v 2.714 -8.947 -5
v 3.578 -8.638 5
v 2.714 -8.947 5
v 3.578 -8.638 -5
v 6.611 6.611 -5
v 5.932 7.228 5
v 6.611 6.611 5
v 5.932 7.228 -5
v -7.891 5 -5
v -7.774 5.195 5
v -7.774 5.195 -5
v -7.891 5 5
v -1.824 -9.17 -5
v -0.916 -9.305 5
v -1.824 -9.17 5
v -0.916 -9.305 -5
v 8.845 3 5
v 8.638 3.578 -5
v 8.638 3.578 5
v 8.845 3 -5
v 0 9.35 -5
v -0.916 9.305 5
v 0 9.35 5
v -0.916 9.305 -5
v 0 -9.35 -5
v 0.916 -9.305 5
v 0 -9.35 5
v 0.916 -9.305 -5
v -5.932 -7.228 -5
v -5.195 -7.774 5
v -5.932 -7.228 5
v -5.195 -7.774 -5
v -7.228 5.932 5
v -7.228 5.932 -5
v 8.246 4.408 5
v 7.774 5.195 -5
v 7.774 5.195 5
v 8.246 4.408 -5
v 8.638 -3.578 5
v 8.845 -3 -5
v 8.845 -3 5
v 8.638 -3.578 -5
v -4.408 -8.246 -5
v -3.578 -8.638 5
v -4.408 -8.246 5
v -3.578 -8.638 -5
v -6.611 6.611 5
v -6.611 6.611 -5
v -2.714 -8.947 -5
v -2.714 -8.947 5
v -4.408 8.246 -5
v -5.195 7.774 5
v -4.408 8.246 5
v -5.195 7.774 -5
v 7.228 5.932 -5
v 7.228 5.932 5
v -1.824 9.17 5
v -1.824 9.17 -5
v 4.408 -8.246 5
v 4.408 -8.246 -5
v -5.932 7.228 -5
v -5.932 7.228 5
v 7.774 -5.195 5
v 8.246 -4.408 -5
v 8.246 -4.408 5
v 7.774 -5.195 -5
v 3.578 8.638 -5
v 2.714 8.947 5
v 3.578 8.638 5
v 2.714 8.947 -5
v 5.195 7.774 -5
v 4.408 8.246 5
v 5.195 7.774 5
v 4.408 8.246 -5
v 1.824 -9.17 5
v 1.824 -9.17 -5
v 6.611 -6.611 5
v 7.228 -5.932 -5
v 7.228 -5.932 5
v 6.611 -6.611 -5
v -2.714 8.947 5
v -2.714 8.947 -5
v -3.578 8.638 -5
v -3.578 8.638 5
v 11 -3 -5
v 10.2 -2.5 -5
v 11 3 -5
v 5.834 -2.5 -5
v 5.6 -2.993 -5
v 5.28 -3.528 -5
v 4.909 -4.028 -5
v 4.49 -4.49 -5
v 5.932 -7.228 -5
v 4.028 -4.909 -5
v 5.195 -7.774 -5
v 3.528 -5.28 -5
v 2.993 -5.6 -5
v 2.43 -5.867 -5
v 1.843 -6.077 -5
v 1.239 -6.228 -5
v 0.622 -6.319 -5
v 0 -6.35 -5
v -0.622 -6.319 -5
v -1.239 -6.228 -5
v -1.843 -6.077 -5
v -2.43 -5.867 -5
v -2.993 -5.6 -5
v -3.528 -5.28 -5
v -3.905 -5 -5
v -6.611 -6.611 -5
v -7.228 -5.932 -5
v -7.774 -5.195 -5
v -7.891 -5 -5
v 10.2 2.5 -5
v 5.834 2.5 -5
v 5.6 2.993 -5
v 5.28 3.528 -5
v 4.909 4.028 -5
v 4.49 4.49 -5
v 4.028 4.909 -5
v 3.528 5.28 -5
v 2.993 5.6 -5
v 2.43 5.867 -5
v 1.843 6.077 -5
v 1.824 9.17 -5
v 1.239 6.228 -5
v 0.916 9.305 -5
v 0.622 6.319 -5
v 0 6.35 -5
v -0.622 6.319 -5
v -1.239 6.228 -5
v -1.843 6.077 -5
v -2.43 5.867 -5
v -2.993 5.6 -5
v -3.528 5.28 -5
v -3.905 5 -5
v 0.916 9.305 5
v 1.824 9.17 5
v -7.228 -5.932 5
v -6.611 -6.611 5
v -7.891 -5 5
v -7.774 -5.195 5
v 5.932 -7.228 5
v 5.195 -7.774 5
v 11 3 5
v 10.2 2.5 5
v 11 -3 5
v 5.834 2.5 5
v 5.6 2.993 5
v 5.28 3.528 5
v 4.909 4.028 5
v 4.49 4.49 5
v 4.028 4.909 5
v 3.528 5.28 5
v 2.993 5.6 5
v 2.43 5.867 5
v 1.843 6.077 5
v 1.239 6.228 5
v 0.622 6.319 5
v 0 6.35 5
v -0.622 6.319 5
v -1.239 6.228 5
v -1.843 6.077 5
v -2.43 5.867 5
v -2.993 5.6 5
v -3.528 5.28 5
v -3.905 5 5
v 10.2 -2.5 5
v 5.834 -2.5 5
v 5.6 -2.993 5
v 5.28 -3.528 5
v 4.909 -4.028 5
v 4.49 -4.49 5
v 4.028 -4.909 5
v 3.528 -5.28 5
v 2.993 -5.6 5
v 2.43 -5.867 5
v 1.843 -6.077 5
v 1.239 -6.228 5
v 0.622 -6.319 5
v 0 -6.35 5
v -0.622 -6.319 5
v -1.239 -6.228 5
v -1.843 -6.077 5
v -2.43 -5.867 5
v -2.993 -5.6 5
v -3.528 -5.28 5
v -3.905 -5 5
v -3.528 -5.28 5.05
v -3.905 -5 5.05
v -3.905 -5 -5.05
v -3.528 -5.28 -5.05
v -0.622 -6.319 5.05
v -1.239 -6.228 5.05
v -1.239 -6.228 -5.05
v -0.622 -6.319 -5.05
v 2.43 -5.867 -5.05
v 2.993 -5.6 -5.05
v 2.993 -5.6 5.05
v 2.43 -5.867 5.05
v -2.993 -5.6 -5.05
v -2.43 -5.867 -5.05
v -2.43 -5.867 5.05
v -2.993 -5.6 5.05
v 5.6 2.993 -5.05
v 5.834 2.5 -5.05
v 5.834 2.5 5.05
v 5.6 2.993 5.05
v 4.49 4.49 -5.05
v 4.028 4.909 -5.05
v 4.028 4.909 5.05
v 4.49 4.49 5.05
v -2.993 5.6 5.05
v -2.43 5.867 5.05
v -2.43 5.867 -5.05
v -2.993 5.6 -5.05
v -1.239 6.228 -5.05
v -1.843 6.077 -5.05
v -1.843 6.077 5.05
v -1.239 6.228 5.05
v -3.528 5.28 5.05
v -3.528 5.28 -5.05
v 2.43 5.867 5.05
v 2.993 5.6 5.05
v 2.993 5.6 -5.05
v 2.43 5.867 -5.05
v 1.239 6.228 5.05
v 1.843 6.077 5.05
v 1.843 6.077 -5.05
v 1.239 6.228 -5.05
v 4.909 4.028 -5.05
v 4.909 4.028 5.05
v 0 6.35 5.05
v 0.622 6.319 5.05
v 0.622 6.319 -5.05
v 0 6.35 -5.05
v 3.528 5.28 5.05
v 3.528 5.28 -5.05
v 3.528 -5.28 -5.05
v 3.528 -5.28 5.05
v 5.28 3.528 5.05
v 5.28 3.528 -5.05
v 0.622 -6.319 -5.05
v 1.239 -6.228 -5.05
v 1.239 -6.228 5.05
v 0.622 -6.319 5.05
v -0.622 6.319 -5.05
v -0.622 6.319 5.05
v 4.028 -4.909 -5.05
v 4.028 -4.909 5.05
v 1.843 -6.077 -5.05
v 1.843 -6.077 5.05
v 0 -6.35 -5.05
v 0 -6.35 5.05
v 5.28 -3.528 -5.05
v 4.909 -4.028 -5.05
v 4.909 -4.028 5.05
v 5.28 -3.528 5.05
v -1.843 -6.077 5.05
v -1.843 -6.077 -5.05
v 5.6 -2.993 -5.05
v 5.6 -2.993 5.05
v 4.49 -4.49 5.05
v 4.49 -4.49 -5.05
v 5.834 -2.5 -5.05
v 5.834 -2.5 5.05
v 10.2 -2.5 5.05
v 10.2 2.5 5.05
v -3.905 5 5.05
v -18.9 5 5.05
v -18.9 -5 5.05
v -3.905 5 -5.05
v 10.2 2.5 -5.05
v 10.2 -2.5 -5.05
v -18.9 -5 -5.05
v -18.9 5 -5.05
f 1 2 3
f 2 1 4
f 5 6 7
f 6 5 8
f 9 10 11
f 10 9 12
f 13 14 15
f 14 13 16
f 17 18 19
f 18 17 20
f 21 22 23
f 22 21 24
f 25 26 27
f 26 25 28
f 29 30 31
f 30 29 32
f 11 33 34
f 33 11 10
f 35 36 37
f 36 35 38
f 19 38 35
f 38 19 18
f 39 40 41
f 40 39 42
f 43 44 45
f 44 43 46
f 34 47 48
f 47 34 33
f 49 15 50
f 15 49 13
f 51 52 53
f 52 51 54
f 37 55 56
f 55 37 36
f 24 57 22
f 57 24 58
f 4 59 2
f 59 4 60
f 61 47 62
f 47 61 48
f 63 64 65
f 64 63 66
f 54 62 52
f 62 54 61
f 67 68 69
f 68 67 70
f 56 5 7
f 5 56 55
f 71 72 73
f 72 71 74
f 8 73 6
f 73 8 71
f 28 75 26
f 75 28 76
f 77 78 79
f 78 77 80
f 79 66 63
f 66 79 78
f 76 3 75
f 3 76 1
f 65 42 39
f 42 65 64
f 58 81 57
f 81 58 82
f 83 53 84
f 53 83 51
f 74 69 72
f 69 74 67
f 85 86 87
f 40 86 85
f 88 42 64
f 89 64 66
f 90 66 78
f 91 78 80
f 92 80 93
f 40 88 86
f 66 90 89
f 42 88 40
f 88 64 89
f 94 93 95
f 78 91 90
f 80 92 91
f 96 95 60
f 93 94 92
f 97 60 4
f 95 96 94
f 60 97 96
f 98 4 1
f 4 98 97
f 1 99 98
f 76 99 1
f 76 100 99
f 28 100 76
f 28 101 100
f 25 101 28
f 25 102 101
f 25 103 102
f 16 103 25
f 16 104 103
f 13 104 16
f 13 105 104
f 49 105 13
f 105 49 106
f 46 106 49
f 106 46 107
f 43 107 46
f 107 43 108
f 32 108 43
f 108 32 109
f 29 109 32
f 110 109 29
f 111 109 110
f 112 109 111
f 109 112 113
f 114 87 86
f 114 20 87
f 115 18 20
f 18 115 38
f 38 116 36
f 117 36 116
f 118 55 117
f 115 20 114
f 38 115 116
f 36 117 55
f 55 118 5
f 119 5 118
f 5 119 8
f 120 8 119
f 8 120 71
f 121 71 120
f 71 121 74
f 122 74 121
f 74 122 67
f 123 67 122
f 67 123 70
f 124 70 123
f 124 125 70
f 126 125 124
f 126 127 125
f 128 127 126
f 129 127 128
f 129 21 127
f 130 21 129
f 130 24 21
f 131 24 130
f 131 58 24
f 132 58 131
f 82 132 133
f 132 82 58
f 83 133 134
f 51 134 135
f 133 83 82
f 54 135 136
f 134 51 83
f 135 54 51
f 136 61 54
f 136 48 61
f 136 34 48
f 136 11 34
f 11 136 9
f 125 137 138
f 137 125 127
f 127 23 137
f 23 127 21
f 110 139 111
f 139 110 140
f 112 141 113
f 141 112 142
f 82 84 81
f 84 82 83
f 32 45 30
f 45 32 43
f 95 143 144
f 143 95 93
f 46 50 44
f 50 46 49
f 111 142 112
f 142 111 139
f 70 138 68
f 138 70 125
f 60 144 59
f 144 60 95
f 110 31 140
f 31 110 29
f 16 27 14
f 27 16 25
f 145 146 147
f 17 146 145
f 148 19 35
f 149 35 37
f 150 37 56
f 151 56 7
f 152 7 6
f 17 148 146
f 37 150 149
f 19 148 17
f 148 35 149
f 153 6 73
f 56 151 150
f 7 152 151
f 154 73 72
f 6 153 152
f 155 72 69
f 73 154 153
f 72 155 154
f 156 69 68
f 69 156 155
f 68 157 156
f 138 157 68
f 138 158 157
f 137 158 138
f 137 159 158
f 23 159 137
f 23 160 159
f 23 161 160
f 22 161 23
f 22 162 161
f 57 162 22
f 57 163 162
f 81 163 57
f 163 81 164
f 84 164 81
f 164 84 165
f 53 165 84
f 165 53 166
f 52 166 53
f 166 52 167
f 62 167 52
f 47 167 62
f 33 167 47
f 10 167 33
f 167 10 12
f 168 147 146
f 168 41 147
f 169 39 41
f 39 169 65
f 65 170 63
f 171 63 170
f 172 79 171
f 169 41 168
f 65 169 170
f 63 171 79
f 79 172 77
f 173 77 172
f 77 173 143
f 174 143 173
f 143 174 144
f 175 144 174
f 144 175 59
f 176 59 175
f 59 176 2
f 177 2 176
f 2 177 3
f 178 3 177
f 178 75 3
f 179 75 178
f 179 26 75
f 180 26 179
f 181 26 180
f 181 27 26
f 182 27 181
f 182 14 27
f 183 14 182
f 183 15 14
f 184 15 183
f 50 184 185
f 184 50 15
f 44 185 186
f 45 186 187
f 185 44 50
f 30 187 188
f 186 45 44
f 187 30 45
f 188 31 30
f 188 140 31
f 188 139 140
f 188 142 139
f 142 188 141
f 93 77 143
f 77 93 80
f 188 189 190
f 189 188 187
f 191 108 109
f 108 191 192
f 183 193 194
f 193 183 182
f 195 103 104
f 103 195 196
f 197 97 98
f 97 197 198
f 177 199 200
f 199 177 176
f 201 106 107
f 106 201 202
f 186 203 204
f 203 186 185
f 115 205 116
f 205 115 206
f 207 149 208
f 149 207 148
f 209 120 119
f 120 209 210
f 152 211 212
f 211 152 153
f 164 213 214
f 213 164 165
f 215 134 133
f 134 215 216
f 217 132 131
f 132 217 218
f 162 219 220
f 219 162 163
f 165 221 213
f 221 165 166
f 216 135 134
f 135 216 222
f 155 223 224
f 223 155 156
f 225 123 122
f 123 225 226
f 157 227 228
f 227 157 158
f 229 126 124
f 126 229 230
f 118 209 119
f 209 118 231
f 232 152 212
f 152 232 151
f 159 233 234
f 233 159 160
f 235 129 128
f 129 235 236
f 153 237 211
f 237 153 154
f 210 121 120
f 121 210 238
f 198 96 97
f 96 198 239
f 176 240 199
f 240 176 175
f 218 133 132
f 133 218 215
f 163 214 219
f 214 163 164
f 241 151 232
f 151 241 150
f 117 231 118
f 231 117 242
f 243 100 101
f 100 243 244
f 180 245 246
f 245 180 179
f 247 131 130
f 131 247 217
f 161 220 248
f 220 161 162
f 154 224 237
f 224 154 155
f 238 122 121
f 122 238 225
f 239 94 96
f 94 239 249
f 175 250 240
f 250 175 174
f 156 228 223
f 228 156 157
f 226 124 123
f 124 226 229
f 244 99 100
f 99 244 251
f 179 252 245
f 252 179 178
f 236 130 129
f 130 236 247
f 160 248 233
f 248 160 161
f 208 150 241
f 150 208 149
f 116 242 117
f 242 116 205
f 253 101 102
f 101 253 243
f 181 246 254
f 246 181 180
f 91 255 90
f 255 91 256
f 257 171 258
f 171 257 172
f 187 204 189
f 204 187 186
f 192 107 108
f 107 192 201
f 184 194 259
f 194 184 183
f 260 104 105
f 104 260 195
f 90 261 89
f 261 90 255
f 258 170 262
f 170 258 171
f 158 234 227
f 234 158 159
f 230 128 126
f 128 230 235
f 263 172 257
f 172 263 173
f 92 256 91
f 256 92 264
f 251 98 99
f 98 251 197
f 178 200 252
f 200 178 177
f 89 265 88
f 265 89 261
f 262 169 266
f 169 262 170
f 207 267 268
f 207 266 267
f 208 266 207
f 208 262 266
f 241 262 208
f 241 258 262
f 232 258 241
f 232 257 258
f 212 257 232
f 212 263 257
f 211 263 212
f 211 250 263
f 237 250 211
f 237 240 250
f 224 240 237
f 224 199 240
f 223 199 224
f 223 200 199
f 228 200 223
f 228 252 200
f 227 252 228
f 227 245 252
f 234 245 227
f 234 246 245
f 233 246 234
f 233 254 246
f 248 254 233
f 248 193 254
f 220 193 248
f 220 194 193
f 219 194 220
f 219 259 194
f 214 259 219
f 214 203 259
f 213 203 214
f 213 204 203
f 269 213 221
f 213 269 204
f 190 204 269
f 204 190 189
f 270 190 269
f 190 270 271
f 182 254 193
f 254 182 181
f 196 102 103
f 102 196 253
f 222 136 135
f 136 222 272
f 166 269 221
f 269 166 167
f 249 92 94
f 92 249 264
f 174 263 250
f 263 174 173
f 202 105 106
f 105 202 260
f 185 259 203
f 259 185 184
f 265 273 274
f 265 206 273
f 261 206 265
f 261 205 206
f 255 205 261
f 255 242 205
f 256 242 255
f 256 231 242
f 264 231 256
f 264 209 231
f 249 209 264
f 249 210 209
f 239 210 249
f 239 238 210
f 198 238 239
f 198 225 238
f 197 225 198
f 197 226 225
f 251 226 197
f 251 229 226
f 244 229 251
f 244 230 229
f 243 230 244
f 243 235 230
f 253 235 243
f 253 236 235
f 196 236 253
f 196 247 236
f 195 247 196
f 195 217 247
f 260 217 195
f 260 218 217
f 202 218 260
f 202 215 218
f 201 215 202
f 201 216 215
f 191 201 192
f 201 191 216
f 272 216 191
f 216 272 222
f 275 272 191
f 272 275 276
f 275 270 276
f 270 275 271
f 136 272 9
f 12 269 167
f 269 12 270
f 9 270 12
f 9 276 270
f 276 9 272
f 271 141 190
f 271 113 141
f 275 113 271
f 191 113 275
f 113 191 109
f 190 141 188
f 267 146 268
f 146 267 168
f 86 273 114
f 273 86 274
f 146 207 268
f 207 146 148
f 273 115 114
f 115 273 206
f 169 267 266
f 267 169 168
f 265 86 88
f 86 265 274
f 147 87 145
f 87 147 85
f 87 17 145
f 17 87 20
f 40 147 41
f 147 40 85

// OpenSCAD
$fn = 64;

// Dimensions
rod_diameter = 12.7;       // 1/2 inch
rod_wall = 3.0;            // Wall thickness of rod ring
rod_ring_z = 10.0;          // Height of the clip
rod_ring_opening_w = 10.0; // Width of the opening on the -X side

tubing_diameter = 6.0;     // Inner diameter of tubing ring
tubing_wall = 2.0;         // Wall thickness of tubing ring
tubing_ring_z = 10.0;      // Height of the clip
tubing_ring_opening_w = 4.5;// Width of the opening on the +X side

bridge_width = 6.0;        // Width of the bridge in X
bridge_depth = 6.0;        // Depth of the bridge in Y

// Derived Dimensions
rod_outer_diameter = rod_diameter + (rod_wall * 2);
tubing_outer_diameter = tubing_diameter + (tubing_wall * 2);
tubing_ring_x_pos = 15.0;   // X position of the tubing ring
tubing_ring_y_pos = 0.0;    // Y position of the tubing ring

// Bridge Geometry
bridge_x_start = 8.0;
bridge_x_end = 12.0;
bridge_y_start = -bridge_depth / 2;
bridge_y_end = bridge_depth / 2;

module rod_ring_shape() {
    // Outer cylinder
    cylinder(d = rod_outer_diameter, h = rod_ring_z, center = true);
    
    // Inner cylinder (cutout for rod)
    cylinder(d = rod_diameter, h = rod_ring_z + 0.1, center = true);
    
    // Opening cutout on -X side
    translate([-rod_outer_diameter/2 - 0.1, 0, 0])
        cube([rod_outer_diameter + 0.2, 10, rod_ring_z + 0.1], center = true);
}

module tubing_ring_shape() {
    // Outer cylinder
    cylinder(d = tubing_outer_diameter, h = tubing_ring_z, center = true);
    
    // Inner cylinder (cutout for tubing)
    cylinder(d = tubing_diameter, h = tubing_ring_z + 0.1, center = true);
    
    // Opening cutout on +X side
    translate([tubing_outer_diameter/2 + 0.1, 0, 0])
        cube([tubing_outer_diameter + 0.2, 5, tubing_ring_z + 0.1], center = true);
}

module bridge_shape() {
    // Solid block connecting the two rings
    translate([bridge_x_start, 0, 0])
        cube([bridge_width, bridge_depth, rod_ring_z], center = true);
}

module clip() {
    union() {
        rod_ring_shape();
        tubing_ring_shape();
        bridge_shape();
    }
}

// Render the clip
clip();
